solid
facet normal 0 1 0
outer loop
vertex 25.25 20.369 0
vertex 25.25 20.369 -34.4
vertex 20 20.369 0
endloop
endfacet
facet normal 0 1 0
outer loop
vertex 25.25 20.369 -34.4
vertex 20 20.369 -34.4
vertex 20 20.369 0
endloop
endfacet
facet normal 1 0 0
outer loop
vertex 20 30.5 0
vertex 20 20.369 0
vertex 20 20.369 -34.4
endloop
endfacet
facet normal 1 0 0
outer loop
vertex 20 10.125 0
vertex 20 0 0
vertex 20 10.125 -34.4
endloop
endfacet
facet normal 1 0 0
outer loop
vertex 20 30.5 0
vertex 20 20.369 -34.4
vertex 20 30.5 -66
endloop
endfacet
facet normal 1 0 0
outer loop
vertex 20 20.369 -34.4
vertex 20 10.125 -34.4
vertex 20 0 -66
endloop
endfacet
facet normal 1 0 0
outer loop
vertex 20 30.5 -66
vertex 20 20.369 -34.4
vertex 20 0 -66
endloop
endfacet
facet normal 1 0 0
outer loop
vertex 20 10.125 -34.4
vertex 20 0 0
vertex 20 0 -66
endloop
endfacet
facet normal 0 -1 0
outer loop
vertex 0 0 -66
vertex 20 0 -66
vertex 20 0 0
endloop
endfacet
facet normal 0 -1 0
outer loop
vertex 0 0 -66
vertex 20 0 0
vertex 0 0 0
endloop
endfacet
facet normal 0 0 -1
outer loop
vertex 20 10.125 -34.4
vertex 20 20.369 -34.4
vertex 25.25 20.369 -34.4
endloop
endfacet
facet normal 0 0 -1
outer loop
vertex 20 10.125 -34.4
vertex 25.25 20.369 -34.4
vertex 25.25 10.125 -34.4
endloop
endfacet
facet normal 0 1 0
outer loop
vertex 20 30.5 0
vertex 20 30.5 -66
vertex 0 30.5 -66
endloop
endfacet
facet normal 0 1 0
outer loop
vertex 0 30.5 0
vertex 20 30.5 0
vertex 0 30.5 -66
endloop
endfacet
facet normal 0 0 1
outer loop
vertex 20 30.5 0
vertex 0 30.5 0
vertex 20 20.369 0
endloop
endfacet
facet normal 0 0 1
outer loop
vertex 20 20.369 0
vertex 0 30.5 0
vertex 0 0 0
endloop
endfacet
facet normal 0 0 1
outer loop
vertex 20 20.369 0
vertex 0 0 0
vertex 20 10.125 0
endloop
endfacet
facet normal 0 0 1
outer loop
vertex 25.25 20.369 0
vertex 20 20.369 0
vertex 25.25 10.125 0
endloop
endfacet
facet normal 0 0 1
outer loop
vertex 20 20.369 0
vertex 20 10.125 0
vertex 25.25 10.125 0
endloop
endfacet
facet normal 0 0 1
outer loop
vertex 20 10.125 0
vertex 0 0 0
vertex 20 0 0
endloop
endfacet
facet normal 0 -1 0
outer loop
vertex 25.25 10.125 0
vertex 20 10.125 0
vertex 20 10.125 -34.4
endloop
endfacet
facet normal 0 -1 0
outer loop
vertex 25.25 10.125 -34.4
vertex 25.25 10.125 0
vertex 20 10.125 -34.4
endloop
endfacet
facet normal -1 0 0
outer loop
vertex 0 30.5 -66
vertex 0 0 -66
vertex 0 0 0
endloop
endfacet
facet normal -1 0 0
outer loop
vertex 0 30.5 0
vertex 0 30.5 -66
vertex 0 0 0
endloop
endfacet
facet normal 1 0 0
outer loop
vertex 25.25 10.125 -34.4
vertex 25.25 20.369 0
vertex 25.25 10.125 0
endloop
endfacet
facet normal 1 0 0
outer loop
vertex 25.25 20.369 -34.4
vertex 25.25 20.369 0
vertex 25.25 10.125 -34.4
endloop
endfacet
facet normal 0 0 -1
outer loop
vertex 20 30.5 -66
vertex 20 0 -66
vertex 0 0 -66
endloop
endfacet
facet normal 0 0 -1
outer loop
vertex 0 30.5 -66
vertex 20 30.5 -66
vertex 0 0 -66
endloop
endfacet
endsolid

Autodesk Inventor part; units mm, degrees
ref_plane "YZ Plane" through (0, 0, 0) normal (1, 0, 0) x (0, 1, 0)
ref_plane "XZ Plane" through (0, 0, 0) normal (0, 1, 0) x (-1, 0, 0)
sketch "Sketch2" plane through (0, 0, 0) normal (0, 1, 0) x (-1, 0, 0)
  line L0 (0, 0) -> (-20, 0)
  line L1 (-20, 0) -> (-20, -66)
  line L2 (-20, -66) -> (0, -66)
  line L3 (0, -66) -> (0, 0)
  dimension "d0" = 20
  dimension "d1" = 66
extrude "Extrusion1" add sketch "Sketch2" along normal blind 30.5
sketch "Sketch3" plane through (20, 0, 0) normal (1, 0, 0) x (0, 0, -1)
  line L0 (39.4, 20.369) -> (34.4, 20.369) projected
  line L1 (39.4, 10.125) -> (34.4, 10.125) projected
  line L2 (34.4, 18.9168) -> (34.4, 10.625) projected
  line L3 (34.4, 20.369) -> (34.4, 18.9308) projected
  line L4 (0, 0) -> (0, 30.5) projected
  line L5 (34.4, 20.369) -> (0, 20.369)
  line L6 (0, 20.369) -> (0, 10.125)
  line L7 (0, 10.125) -> (34.4, 10.125)
  line L8 (34.4, 10.125) -> (34.4, 20.369)
ref_plane "Work Plane1" through (25.25, 10.625, -39.4) normal (1, 0, 0) x (0, 1, 0)
extrude "Extrusion2" add sketch "Sketch3" along normal up to surface (5.25 mm away)
properties part number "lipo3s650"
